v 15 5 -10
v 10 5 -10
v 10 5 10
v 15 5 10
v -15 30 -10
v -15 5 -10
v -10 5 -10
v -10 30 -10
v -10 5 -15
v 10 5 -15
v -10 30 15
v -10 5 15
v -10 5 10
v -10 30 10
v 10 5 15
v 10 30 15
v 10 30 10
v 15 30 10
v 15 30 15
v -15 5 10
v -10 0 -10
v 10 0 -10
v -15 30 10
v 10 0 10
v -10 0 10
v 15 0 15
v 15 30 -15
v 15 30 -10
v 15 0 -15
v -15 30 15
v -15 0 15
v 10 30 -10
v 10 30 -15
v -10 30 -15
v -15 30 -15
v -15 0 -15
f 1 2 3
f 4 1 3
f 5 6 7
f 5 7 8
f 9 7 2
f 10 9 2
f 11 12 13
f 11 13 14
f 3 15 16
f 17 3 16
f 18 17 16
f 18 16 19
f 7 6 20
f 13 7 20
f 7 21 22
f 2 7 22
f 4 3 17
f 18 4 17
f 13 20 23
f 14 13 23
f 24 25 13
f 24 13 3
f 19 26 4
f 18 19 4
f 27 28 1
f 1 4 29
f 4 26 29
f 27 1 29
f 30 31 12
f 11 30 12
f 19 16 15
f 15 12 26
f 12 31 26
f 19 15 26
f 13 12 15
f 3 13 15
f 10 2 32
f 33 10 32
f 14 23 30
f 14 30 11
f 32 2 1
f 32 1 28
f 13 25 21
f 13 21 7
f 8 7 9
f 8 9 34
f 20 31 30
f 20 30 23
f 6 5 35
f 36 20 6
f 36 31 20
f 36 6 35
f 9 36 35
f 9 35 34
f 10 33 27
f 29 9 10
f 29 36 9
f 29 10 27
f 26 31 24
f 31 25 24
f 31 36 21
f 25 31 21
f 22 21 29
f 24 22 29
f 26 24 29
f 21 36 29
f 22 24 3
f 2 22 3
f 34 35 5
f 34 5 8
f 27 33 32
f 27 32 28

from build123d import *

# Parameters (mm, degrees)
ESQUISSE1_W             = 30
ESQUISSE1_H             = 30
ESQUISSE1_W_2           = 20
ESQUISSE1_H_2           = 20
BOSS_EXTRU_1_DEPTH      = 30
ESQUISSE3_W             = 20
ESQUISSE3_H             = 25
ENL_V_MAT_EXTRU_1_DEPTH = 31
ESQUISSE4_W             = 20
ESQUISSE4_H             = 25
ENL_V_MAT_EXTRU_2_DEPTH = 31


with BuildPart() as part:
    # Esquisse1 → Boss.-Extru.1 (new body)
    with BuildSketch(Plane(origin=(0, 0, 0), x_dir=(1, 0, 0), z_dir=(0, 1, 0))):
        Rectangle(ESQUISSE1_W, ESQUISSE1_H)
        Rectangle(ESQUISSE1_W_2, ESQUISSE1_H_2, mode=Mode.SUBTRACT)
    extrude(amount=BOSS_EXTRU_1_DEPTH)

    # Esquisse3 → Enlèv. mat.-Extru.1 (cut, through all)
    with BuildSketch(Plane.XY.offset(15)):
        with Locations((0, 17.5)):
            Rectangle(ESQUISSE3_W, ESQUISSE3_H)
    extrude(amount=-ENL_V_MAT_EXTRU_1_DEPTH, mode=Mode.SUBTRACT)

    # Esquisse4 → Enlèv. mat.-Extru.2 (cut, through all)
    with BuildSketch(Plane.ZY.offset(15)):
        with Locations((0, 17.5)):
            Rectangle(ESQUISSE4_W, ESQUISSE4_H)
    extrude(amount=-ENL_V_MAT_EXTRU_2_DEPTH, mode=Mode.SUBTRACT)


solid = part.part
